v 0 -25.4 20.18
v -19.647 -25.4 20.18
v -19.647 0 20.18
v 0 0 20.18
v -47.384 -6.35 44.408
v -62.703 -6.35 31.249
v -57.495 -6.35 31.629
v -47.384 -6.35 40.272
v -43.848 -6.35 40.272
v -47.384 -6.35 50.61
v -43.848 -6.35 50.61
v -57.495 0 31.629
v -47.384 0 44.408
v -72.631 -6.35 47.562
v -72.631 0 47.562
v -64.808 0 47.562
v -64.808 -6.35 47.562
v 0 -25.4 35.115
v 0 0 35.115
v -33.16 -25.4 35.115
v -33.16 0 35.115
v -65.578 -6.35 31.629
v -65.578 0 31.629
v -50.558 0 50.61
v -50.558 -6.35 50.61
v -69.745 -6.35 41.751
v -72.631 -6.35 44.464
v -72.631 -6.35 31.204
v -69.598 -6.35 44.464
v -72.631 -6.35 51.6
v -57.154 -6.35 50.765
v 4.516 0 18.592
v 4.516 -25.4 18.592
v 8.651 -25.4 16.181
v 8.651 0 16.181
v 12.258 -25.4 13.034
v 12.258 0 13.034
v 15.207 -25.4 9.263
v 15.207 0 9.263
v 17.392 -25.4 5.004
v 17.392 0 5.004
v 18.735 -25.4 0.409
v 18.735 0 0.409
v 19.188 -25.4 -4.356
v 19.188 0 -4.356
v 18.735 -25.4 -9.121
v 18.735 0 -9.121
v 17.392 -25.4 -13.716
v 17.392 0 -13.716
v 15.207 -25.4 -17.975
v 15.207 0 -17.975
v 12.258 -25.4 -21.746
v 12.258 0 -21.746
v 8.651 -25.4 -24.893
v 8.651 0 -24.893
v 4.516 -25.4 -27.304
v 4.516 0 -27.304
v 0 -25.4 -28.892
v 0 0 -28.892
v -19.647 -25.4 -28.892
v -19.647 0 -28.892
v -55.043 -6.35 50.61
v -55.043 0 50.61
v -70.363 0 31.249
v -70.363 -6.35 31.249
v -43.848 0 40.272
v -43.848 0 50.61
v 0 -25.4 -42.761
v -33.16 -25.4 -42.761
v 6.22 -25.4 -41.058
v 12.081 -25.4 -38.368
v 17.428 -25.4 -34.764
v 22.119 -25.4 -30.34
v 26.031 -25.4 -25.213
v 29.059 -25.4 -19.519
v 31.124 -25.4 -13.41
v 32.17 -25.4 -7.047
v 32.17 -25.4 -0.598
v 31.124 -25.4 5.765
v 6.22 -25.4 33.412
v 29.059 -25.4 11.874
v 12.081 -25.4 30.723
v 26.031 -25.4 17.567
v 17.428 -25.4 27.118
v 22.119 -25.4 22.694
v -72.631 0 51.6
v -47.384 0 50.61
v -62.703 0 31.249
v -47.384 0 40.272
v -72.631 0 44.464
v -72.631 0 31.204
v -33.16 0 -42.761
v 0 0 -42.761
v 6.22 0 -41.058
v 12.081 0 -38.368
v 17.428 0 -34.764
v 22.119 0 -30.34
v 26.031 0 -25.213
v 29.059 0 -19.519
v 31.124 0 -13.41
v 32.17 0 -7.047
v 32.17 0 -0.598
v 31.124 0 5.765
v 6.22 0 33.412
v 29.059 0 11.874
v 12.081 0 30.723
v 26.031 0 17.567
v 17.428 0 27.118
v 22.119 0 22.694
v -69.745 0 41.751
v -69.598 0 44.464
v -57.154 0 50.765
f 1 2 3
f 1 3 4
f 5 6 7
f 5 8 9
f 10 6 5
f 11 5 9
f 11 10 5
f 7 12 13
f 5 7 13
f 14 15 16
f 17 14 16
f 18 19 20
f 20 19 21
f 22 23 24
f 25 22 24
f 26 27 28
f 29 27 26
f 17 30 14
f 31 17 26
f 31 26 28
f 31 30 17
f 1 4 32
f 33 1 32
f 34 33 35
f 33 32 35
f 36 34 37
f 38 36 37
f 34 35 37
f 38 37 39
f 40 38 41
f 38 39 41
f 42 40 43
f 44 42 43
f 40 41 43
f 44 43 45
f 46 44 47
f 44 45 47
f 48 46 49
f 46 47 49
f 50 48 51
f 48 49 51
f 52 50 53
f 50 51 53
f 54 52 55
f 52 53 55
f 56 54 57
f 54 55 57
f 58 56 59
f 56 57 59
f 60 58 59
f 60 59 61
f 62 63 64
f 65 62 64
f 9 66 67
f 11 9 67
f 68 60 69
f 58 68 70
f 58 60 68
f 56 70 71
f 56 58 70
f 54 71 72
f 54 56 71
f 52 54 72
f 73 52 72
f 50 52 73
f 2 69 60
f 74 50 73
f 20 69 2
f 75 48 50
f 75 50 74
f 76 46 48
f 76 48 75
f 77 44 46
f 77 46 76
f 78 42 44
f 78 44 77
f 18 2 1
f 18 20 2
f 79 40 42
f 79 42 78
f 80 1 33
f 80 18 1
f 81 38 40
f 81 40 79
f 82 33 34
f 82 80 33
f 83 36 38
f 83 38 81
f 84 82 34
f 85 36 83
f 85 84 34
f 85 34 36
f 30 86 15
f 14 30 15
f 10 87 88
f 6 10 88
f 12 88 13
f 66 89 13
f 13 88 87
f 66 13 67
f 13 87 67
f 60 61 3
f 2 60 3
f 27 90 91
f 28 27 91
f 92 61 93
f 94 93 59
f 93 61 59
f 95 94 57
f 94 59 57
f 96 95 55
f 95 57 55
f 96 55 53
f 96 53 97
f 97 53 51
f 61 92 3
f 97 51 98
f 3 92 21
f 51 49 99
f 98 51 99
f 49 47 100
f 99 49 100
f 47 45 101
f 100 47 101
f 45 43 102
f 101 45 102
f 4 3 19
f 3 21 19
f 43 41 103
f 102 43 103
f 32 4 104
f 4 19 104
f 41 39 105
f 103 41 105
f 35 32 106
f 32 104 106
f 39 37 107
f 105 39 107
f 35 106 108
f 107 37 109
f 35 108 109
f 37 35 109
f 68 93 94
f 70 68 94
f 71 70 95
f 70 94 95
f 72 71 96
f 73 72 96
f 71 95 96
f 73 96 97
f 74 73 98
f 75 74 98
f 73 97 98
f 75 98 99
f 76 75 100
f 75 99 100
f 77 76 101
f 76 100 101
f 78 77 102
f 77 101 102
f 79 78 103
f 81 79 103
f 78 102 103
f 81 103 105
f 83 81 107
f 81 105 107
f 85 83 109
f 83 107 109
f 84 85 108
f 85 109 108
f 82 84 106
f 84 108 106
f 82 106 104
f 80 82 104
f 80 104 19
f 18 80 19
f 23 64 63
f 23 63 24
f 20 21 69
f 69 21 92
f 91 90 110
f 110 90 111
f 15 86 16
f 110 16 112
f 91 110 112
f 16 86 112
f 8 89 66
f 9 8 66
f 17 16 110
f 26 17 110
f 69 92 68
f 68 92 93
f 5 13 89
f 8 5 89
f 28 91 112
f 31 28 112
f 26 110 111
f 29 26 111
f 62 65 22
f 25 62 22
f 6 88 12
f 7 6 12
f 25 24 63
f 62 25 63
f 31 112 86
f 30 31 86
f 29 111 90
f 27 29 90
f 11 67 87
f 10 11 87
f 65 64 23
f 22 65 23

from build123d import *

# Parameters (mm, degrees)
F1_DEPTH = 25.4
F3_DEPTH = 6.35


with BuildPart() as f1:
    # F0 (on Front) → F1 (new body)
    with BuildSketch(Plane.XZ):
        with BuildLine():
            Line((0, 35.115499), (-33.159699, 35.115499))
            Line((-33.159699, 35.115499), (-33.159699, -42.760901))
            Line((-33.159699, -42.760901), (0, -42.760901))
            ThreePointArc((0, -42.760901), (32.301346, -3.822701), (0, 35.115499))
        make_face()
        with BuildLine():
            Line((-19.6469, -28.8925), (-19.6469, 20.1803))
            Line((-19.6469, 20.1803), (0, 20.1803))
            ThreePointArc((0, 20.1803), (19.188242, -4.3561), (0, -28.8925))
            Line((0, -28.8925), (-19.6469, -28.8925))
        make_face(mode=Mode.SUBTRACT)
    extrude(amount=F1_DEPTH)


with BuildPart() as f3:
    # F2 (on Front) → F3 (new body)
    with BuildSketch(Plane.XZ):
        Polygon((-57.153762, 50.764567), (-72.631299, 51.60002), (-72.631299, 47.5615), (-69.430903, 47.5615), (-64.8081, 47.5615), (-69.74456, 41.7507), (-69.598089, 44.464219), (-72.631299, 44.464219), (-72.631299, 31.2039), align=None)
        Polygon((-55.043463, 50.61043), (-70.362989, 31.249458), (-65.577642, 31.628876), (-50.558333, 50.61043), align=None)
        Polygon((-47.3837, 50.61043), (-62.703226, 31.249458), (-57.495244, 31.628876), (-47.3837, 44.407948), (-47.3837, 40.271699), (-43.847863, 40.271699), (-43.847863, 50.61043), align=None)
    extrude(amount=F3_DEPTH)


solid = Compound([f1.part, f3.part])
